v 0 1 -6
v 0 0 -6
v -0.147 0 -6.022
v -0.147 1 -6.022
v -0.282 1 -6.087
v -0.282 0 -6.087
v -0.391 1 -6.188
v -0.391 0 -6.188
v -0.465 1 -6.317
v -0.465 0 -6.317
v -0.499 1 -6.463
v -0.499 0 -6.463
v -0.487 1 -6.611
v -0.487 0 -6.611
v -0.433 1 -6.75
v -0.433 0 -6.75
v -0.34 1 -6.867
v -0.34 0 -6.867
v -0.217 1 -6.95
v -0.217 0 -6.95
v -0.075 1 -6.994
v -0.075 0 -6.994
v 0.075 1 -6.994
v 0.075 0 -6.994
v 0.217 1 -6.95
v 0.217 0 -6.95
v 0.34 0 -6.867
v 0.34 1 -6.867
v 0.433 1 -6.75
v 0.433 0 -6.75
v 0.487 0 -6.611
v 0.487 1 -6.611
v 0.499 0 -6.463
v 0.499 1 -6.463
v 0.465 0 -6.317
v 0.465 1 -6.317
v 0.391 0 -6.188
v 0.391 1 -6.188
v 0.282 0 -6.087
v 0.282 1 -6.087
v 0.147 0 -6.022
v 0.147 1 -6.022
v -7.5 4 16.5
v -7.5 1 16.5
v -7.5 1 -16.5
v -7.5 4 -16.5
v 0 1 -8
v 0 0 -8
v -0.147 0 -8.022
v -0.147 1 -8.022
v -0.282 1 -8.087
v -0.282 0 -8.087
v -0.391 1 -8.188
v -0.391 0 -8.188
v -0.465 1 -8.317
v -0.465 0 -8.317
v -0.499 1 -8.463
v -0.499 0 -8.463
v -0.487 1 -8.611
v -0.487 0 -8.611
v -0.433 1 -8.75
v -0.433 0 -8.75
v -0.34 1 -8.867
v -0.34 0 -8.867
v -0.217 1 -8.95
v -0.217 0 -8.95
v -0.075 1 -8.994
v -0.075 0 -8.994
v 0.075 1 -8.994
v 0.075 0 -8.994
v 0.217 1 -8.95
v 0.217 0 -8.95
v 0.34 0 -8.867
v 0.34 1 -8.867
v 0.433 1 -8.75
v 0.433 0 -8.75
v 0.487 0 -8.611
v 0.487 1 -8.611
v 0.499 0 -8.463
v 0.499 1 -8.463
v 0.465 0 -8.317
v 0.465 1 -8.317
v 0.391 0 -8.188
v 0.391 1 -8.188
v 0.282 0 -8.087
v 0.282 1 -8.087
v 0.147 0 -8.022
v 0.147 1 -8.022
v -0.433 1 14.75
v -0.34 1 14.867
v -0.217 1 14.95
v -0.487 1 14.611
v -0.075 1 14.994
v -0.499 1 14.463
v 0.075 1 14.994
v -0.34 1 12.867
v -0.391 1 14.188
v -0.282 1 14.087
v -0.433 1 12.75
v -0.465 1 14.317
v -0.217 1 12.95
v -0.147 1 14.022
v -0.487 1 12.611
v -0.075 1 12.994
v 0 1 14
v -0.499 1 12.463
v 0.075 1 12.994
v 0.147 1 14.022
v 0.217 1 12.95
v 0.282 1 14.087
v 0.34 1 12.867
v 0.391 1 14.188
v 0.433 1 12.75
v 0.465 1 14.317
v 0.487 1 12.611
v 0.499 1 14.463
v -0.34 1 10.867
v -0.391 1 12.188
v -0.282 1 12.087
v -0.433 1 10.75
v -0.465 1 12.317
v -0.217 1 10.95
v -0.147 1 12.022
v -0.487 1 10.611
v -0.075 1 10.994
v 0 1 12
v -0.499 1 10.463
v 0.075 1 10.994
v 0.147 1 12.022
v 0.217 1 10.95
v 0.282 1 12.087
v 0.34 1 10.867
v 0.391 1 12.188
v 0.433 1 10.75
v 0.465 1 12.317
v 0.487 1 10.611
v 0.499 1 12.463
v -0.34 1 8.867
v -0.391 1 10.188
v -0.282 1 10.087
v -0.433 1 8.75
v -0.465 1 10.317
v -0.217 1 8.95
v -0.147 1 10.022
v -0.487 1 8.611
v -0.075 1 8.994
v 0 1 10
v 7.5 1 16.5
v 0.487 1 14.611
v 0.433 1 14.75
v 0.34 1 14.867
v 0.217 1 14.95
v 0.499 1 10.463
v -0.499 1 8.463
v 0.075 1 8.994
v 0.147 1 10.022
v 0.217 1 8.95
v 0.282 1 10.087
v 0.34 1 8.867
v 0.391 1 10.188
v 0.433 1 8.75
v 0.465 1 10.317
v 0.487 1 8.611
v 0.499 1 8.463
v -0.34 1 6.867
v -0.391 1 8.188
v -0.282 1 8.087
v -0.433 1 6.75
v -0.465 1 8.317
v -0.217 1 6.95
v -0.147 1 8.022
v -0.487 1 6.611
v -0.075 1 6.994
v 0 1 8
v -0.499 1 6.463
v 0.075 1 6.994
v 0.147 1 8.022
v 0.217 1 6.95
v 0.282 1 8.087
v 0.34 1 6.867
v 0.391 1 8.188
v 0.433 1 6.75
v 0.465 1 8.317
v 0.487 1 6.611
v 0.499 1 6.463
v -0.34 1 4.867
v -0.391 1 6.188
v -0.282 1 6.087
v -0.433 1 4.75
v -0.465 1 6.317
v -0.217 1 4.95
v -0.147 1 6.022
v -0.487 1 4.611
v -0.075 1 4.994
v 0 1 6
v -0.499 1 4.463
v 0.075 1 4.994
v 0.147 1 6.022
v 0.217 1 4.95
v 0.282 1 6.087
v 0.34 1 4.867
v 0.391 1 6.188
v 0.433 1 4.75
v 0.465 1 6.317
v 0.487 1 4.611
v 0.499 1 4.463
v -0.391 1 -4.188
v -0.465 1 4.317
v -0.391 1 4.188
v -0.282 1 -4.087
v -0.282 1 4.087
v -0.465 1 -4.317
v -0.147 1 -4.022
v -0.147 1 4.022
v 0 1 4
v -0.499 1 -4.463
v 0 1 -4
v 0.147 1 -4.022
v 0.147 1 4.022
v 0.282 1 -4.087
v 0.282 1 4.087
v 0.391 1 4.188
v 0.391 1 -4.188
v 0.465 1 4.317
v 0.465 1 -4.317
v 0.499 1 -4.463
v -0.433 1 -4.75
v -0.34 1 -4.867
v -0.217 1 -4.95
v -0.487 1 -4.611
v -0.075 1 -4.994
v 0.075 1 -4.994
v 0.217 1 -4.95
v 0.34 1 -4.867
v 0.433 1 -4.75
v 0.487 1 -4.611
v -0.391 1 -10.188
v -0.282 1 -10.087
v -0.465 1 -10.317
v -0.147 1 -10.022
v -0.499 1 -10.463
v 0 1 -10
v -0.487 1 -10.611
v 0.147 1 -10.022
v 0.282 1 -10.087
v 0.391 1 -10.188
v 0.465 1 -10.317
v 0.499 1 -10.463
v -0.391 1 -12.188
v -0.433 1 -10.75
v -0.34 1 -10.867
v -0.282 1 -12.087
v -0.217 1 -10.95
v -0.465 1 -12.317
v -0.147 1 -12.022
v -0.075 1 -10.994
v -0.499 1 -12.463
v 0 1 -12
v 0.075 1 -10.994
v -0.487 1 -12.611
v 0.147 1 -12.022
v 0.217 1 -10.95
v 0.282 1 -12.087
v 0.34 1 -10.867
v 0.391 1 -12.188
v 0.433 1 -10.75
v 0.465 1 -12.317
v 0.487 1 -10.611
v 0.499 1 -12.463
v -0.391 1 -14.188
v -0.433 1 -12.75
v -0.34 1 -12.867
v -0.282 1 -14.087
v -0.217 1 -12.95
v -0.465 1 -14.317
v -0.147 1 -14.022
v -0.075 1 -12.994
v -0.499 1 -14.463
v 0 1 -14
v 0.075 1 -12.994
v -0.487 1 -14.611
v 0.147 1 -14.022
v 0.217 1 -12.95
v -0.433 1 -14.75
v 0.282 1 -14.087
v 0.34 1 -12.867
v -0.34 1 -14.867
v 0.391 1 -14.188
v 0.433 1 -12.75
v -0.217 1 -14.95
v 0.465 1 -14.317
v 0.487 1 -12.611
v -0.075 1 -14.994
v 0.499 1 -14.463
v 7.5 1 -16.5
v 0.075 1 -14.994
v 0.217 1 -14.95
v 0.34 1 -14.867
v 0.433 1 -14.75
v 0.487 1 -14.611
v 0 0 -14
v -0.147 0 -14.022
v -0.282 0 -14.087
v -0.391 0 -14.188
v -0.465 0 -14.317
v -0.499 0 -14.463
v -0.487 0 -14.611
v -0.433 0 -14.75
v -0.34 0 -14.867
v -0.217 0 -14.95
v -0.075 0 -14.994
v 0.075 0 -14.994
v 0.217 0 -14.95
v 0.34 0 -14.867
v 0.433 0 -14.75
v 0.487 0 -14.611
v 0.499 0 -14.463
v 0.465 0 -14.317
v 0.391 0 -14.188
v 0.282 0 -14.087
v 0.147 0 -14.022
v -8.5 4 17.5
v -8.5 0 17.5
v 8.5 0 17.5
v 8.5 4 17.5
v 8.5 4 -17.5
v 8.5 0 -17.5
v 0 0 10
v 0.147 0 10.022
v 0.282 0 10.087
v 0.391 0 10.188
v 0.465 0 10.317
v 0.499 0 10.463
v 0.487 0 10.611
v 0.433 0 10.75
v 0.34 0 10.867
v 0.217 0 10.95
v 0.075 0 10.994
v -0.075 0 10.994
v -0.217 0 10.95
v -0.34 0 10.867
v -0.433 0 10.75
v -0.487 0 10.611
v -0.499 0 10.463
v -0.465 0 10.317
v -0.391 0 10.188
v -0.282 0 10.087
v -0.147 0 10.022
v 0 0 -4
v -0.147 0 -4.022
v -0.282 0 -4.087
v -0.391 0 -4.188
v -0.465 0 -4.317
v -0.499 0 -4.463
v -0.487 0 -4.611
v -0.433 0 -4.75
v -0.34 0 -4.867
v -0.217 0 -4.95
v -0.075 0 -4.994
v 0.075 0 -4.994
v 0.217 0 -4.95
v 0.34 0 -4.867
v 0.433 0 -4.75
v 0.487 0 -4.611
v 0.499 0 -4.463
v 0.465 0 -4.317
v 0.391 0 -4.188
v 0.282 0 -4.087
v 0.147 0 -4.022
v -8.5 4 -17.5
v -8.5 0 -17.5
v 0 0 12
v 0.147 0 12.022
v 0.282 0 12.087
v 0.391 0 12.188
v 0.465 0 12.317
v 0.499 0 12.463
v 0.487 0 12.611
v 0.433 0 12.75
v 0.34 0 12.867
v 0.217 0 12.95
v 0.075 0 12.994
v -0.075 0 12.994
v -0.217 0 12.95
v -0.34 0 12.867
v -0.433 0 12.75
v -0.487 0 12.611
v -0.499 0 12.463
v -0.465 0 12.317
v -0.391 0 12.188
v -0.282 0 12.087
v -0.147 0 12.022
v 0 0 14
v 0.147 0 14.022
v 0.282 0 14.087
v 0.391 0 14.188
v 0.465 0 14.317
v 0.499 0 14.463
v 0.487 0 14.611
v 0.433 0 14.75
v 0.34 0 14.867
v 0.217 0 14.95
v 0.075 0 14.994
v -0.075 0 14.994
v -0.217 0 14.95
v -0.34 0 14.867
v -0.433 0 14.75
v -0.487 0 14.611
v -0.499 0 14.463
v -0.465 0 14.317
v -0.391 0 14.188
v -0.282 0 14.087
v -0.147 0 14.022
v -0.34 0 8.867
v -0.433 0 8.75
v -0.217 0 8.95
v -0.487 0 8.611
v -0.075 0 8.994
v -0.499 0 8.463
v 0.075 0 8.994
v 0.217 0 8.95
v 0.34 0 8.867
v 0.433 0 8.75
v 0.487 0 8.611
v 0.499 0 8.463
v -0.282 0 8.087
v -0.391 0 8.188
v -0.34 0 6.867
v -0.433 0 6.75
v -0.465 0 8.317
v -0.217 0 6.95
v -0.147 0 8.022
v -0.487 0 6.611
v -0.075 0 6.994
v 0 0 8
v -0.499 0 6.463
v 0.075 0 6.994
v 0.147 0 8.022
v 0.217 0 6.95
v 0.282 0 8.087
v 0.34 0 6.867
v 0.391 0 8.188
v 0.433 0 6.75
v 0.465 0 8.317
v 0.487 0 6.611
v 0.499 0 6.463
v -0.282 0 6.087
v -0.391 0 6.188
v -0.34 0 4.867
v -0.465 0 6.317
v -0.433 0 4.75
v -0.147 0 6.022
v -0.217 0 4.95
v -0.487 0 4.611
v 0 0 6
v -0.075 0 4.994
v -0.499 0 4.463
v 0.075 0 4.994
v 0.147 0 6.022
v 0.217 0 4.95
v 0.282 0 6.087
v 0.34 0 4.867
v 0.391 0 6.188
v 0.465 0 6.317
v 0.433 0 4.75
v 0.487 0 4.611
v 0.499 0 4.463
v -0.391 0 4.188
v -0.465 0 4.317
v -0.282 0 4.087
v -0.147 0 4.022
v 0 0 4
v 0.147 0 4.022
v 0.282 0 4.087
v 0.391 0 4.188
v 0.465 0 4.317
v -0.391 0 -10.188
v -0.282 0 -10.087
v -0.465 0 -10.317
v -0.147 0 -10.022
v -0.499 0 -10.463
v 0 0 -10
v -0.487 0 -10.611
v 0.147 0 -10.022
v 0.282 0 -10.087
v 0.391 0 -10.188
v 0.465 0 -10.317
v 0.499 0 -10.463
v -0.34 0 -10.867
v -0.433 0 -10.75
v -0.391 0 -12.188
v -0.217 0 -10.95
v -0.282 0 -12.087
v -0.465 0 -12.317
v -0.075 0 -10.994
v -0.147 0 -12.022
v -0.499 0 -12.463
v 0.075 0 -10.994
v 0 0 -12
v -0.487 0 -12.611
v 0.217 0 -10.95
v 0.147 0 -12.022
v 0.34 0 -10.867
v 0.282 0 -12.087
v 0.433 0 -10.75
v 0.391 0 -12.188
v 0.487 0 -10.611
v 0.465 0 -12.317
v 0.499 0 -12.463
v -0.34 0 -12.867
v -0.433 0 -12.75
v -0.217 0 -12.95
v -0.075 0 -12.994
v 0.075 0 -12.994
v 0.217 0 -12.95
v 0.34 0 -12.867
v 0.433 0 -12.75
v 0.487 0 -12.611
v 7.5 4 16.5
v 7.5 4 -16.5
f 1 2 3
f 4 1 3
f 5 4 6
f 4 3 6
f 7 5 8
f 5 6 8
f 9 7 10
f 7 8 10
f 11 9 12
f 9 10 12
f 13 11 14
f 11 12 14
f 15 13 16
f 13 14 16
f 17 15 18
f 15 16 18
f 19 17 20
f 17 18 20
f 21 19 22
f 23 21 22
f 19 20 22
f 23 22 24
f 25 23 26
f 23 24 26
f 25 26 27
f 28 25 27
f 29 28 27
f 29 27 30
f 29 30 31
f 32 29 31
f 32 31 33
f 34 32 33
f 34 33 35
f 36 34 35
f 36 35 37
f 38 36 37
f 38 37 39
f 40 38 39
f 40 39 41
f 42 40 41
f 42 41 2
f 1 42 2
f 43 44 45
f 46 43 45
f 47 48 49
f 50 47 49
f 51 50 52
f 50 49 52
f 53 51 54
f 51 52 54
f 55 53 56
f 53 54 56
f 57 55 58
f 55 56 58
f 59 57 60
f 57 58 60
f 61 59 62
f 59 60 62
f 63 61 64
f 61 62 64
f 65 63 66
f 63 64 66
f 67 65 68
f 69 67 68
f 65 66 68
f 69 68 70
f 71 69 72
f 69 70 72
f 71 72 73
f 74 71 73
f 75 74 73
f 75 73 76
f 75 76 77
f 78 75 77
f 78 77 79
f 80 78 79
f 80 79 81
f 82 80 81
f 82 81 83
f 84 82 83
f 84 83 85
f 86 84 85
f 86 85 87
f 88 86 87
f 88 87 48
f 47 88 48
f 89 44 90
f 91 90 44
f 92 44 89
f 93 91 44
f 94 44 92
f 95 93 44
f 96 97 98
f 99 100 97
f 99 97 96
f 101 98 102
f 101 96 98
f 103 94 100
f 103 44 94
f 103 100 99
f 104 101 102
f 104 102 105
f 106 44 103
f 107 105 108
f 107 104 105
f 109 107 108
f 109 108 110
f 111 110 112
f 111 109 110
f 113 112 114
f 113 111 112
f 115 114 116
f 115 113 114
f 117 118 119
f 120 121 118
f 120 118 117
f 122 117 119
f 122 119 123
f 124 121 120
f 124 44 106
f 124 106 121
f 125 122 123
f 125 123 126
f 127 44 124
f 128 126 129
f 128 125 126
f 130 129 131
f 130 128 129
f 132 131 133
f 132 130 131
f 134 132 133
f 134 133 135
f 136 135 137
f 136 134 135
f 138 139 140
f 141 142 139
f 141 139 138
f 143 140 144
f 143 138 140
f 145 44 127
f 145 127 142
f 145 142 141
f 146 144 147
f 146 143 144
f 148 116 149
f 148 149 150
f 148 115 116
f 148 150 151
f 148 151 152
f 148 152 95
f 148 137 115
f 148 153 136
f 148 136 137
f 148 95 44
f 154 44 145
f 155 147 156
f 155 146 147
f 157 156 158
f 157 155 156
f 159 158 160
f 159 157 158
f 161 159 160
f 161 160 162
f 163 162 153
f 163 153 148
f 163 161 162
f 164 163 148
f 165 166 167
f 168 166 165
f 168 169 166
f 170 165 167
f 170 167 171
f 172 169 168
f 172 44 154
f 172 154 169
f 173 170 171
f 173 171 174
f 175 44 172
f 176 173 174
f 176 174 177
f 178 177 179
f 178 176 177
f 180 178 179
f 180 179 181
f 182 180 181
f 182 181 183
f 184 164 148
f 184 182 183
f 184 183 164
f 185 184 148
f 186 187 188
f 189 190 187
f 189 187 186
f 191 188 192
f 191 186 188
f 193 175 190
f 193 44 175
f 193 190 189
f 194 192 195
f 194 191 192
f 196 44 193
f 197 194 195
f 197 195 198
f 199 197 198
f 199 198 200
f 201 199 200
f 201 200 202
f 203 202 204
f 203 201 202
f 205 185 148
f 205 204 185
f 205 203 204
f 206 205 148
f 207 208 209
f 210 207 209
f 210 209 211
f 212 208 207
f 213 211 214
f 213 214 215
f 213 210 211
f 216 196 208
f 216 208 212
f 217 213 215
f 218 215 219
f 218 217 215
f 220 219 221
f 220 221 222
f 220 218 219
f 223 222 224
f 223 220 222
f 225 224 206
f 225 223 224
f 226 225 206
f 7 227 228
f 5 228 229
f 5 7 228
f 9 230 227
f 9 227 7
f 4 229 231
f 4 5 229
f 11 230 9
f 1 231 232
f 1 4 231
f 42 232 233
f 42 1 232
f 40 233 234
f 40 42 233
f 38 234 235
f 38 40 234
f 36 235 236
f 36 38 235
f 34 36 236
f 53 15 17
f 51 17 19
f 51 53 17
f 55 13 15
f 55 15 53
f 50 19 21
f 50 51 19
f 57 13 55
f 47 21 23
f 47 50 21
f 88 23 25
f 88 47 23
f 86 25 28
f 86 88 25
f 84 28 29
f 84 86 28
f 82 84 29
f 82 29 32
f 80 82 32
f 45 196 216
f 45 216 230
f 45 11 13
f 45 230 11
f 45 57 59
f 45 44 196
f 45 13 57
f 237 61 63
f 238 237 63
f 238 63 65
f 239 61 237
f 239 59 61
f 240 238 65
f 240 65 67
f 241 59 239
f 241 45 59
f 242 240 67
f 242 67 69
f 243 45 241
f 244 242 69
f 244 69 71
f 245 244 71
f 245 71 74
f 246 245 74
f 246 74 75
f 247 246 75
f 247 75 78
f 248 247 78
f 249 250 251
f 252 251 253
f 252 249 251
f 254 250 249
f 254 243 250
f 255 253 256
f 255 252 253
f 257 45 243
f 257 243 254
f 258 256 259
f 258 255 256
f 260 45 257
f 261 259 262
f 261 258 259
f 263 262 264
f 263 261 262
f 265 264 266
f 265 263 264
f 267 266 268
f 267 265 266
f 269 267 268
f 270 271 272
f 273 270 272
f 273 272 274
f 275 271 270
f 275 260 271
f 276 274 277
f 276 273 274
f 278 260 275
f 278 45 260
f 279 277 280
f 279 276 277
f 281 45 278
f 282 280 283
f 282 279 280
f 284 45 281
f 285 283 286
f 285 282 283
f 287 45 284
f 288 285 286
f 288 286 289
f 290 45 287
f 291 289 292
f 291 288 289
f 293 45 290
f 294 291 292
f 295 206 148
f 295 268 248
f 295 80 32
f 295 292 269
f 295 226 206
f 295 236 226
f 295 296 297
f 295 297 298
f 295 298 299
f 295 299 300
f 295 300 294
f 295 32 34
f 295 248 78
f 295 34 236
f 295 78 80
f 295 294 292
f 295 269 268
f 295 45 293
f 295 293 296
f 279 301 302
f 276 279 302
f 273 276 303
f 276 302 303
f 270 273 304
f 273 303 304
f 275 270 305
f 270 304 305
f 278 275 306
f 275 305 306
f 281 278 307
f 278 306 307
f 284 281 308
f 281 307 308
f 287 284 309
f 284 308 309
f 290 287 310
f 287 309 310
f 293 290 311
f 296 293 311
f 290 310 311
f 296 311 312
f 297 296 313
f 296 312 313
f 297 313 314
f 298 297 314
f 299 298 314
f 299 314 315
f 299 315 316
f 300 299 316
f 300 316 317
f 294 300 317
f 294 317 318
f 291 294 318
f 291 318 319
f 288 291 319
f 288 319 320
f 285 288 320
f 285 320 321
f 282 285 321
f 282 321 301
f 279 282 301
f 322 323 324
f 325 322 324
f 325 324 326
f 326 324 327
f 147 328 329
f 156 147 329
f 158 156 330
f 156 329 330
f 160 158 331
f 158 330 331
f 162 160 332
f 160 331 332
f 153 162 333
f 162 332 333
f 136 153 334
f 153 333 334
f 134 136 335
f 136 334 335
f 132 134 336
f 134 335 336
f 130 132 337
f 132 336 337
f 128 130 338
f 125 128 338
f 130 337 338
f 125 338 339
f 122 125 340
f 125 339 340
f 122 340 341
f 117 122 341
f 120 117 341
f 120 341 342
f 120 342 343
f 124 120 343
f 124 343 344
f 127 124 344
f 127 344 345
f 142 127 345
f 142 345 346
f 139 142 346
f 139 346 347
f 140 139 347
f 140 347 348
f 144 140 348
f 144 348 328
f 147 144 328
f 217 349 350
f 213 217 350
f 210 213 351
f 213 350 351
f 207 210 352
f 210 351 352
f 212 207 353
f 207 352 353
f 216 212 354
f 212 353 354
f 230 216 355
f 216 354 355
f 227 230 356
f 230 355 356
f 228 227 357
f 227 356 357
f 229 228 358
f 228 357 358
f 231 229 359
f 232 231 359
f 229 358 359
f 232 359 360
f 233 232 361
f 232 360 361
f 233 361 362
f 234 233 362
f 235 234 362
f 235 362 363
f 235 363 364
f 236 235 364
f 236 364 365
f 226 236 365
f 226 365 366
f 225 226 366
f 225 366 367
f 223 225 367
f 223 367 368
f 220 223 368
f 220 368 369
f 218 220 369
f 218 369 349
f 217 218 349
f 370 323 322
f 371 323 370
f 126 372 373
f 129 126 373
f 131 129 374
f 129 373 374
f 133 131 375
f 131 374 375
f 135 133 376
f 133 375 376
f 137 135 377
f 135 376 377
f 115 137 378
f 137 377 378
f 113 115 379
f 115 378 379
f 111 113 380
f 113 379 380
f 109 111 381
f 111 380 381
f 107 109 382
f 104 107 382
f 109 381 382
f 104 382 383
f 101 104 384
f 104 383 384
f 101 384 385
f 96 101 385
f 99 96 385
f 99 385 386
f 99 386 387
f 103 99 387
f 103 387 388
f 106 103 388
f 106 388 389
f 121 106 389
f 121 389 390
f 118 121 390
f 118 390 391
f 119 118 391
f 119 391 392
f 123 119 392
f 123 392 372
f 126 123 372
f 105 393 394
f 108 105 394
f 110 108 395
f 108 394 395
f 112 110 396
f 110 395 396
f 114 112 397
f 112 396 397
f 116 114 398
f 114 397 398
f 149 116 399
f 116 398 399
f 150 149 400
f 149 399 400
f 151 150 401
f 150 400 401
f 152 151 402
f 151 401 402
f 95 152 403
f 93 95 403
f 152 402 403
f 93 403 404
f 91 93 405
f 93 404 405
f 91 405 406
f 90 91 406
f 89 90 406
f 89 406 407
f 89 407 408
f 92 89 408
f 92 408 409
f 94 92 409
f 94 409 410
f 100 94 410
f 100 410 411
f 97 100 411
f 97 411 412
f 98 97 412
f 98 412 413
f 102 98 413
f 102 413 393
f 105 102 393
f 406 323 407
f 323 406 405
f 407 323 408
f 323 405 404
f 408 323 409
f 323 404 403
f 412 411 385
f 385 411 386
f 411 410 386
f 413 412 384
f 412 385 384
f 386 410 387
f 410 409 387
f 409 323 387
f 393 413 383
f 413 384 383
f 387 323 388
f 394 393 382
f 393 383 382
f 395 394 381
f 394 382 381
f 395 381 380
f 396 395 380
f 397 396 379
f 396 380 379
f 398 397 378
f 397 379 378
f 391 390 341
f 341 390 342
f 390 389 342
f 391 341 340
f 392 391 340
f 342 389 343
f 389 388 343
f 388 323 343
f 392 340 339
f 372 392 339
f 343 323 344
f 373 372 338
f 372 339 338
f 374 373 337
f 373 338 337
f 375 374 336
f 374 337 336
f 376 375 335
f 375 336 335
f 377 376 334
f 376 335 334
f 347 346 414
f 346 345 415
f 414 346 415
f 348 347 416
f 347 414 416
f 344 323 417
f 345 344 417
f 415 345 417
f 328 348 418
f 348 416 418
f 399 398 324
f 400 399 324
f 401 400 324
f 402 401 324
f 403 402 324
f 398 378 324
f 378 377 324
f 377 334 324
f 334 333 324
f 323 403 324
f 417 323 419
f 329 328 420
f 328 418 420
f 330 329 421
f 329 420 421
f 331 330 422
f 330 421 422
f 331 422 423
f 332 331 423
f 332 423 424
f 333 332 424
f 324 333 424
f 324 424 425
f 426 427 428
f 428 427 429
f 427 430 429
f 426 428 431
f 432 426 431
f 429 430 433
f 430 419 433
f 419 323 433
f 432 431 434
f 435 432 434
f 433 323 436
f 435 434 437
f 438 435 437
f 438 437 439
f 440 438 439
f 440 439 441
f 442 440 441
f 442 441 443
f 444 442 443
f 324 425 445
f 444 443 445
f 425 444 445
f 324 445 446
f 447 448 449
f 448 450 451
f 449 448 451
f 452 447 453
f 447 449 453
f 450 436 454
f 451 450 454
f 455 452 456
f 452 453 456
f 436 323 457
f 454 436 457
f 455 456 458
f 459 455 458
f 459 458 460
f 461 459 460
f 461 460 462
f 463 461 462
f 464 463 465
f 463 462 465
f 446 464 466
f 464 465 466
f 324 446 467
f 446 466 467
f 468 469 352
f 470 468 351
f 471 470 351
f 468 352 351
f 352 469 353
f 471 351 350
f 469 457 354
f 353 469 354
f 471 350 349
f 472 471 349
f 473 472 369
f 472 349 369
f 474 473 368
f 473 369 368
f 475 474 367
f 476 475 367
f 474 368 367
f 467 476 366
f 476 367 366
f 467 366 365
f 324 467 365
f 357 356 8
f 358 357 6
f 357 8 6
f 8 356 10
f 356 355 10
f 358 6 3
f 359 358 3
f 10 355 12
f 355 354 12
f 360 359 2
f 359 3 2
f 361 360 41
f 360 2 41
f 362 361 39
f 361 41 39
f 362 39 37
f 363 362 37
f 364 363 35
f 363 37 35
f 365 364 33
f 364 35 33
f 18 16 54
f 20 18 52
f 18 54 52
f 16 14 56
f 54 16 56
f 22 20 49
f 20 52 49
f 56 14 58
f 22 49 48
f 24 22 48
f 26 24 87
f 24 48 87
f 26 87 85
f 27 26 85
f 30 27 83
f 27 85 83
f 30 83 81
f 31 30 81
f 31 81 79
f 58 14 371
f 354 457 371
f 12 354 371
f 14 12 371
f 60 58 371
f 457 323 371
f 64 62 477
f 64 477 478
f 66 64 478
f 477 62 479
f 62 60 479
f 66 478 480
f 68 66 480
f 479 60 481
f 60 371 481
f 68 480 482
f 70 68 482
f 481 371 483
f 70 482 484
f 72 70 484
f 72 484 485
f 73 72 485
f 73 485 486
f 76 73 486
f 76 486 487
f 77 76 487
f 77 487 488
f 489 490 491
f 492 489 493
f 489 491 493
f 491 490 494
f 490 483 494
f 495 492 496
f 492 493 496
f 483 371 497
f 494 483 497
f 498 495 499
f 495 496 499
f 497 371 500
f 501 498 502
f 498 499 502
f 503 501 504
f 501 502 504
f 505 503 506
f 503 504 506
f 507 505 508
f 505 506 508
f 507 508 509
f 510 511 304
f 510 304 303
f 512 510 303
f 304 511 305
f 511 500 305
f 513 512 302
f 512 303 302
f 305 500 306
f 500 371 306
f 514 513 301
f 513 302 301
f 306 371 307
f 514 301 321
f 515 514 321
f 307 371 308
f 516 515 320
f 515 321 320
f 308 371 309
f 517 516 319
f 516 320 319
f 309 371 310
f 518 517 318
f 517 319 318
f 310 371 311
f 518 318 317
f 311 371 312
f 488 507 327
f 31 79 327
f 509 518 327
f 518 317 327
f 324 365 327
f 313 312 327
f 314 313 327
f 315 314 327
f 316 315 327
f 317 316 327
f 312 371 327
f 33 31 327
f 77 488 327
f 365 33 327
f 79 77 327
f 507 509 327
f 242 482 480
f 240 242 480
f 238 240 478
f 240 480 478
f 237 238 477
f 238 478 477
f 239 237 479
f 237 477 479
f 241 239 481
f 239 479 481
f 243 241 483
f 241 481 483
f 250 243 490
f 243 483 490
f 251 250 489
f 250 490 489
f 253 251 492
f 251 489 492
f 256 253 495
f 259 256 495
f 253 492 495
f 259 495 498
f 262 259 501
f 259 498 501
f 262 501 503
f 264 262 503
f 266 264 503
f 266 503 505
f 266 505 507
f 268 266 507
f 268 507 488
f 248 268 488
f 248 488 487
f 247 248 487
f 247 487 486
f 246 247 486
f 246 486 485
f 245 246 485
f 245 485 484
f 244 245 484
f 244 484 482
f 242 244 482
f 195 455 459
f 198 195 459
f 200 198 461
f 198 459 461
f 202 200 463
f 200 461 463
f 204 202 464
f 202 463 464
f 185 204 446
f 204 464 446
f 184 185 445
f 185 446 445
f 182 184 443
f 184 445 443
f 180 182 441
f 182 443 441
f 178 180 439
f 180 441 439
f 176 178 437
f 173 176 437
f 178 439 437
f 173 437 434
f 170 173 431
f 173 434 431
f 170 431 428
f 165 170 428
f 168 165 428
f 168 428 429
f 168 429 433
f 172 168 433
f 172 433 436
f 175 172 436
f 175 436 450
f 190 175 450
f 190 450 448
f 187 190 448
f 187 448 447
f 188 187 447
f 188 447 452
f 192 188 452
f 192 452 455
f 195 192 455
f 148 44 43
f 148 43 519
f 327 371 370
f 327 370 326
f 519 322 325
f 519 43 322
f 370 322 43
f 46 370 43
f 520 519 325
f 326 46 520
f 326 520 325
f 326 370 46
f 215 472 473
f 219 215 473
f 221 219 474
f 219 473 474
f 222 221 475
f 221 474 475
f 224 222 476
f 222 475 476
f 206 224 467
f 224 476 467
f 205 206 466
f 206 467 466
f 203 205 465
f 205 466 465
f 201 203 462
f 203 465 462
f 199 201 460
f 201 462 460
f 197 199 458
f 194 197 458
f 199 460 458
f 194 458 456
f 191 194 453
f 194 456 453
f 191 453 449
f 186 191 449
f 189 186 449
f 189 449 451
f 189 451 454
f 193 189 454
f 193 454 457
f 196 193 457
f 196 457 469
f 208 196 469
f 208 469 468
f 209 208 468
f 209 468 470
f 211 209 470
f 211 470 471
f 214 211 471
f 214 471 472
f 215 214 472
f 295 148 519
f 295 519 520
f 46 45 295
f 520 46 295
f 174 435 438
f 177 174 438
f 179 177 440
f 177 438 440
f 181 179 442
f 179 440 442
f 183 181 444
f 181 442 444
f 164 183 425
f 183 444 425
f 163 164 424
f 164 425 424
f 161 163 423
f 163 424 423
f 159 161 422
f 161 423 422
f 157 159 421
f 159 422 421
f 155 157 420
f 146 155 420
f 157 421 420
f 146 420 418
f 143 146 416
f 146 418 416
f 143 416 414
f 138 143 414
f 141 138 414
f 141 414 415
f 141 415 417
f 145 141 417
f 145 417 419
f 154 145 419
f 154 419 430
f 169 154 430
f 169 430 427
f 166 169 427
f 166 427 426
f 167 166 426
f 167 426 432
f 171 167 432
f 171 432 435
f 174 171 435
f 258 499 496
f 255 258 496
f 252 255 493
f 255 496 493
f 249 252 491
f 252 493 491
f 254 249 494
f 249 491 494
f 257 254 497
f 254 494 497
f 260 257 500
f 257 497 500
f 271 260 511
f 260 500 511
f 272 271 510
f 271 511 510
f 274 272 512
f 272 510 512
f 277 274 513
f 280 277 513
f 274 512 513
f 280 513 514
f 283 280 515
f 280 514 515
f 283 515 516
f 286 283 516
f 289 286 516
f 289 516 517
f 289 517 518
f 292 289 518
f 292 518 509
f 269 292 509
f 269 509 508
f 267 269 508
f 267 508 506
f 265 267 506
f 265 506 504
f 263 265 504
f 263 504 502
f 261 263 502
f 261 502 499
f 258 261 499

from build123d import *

# Parameters (mm, degrees)
SKETCH_1_W          = 17
SKETCH_1_H          = 35
SKETCH_1_W_2        = 15
SKETCH_1_H_2        = 33
EXTRUDE_1_DEPTH     = 4
SKETCH_1_2_W        = 15
SKETCH_1_2_H        = 33
EXTRUDE_2_DEPTH     = 1
SKETCH_2_R          = 0.5
CUT_EXTRUDE_1_DEPTH = 20.862024066


with BuildPart() as part:
    # 草图1 → 凸台-拉伸1 (new body)
    with BuildSketch(Plane(origin=(0, 0, 0), x_dir=(1, 0, 0), z_dir=(0, 1, 0))):
        Rectangle(SKETCH_1_W, SKETCH_1_H)
        Rectangle(SKETCH_1_W_2, SKETCH_1_H_2, mode=Mode.SUBTRACT)
    extrude(amount=EXTRUDE_1_DEPTH)

    # 草图1<2> → 凸台-拉伸2 (add)
    with BuildSketch(Plane(origin=(0, 0, 0), x_dir=(1, 0, 0), z_dir=(0, 1, 0))):
        Rectangle(SKETCH_1_2_W, SKETCH_1_2_H)
    extrude(amount=EXTRUDE_2_DEPTH)

    # 草图2 → 切除-拉伸1 (cut, through all)
    with BuildSketch(Plane.XZ):
        with Locations((0, 14.5)):
            Circle(SKETCH_2_R)
        with Locations((0, 12.5)):
            Circle(SKETCH_2_R)
        with Locations((0, 10.5)):
            Circle(SKETCH_2_R)
        with Locations((0, 8.5)):
            Circle(SKETCH_2_R)
        with Locations((0, 6.5)):
            Circle(SKETCH_2_R)
        with Locations((0, 4.5)):
            Circle(SKETCH_2_R)
        with Locations((0, -4.5)):
            Circle(SKETCH_2_R)
        with Locations((0, -6.5)):
            Circle(SKETCH_2_R)
        with Locations((0, -8.5)):
            Circle(SKETCH_2_R)
        with Locations((0, -10.5)):
            Circle(SKETCH_2_R)
        with Locations((0, -12.5)):
            Circle(SKETCH_2_R)
        with Locations((0, -14.5)):
            Circle(SKETCH_2_R)
    extrude(amount=-CUT_EXTRUDE_1_DEPTH, mode=Mode.SUBTRACT)


solid = part.part
